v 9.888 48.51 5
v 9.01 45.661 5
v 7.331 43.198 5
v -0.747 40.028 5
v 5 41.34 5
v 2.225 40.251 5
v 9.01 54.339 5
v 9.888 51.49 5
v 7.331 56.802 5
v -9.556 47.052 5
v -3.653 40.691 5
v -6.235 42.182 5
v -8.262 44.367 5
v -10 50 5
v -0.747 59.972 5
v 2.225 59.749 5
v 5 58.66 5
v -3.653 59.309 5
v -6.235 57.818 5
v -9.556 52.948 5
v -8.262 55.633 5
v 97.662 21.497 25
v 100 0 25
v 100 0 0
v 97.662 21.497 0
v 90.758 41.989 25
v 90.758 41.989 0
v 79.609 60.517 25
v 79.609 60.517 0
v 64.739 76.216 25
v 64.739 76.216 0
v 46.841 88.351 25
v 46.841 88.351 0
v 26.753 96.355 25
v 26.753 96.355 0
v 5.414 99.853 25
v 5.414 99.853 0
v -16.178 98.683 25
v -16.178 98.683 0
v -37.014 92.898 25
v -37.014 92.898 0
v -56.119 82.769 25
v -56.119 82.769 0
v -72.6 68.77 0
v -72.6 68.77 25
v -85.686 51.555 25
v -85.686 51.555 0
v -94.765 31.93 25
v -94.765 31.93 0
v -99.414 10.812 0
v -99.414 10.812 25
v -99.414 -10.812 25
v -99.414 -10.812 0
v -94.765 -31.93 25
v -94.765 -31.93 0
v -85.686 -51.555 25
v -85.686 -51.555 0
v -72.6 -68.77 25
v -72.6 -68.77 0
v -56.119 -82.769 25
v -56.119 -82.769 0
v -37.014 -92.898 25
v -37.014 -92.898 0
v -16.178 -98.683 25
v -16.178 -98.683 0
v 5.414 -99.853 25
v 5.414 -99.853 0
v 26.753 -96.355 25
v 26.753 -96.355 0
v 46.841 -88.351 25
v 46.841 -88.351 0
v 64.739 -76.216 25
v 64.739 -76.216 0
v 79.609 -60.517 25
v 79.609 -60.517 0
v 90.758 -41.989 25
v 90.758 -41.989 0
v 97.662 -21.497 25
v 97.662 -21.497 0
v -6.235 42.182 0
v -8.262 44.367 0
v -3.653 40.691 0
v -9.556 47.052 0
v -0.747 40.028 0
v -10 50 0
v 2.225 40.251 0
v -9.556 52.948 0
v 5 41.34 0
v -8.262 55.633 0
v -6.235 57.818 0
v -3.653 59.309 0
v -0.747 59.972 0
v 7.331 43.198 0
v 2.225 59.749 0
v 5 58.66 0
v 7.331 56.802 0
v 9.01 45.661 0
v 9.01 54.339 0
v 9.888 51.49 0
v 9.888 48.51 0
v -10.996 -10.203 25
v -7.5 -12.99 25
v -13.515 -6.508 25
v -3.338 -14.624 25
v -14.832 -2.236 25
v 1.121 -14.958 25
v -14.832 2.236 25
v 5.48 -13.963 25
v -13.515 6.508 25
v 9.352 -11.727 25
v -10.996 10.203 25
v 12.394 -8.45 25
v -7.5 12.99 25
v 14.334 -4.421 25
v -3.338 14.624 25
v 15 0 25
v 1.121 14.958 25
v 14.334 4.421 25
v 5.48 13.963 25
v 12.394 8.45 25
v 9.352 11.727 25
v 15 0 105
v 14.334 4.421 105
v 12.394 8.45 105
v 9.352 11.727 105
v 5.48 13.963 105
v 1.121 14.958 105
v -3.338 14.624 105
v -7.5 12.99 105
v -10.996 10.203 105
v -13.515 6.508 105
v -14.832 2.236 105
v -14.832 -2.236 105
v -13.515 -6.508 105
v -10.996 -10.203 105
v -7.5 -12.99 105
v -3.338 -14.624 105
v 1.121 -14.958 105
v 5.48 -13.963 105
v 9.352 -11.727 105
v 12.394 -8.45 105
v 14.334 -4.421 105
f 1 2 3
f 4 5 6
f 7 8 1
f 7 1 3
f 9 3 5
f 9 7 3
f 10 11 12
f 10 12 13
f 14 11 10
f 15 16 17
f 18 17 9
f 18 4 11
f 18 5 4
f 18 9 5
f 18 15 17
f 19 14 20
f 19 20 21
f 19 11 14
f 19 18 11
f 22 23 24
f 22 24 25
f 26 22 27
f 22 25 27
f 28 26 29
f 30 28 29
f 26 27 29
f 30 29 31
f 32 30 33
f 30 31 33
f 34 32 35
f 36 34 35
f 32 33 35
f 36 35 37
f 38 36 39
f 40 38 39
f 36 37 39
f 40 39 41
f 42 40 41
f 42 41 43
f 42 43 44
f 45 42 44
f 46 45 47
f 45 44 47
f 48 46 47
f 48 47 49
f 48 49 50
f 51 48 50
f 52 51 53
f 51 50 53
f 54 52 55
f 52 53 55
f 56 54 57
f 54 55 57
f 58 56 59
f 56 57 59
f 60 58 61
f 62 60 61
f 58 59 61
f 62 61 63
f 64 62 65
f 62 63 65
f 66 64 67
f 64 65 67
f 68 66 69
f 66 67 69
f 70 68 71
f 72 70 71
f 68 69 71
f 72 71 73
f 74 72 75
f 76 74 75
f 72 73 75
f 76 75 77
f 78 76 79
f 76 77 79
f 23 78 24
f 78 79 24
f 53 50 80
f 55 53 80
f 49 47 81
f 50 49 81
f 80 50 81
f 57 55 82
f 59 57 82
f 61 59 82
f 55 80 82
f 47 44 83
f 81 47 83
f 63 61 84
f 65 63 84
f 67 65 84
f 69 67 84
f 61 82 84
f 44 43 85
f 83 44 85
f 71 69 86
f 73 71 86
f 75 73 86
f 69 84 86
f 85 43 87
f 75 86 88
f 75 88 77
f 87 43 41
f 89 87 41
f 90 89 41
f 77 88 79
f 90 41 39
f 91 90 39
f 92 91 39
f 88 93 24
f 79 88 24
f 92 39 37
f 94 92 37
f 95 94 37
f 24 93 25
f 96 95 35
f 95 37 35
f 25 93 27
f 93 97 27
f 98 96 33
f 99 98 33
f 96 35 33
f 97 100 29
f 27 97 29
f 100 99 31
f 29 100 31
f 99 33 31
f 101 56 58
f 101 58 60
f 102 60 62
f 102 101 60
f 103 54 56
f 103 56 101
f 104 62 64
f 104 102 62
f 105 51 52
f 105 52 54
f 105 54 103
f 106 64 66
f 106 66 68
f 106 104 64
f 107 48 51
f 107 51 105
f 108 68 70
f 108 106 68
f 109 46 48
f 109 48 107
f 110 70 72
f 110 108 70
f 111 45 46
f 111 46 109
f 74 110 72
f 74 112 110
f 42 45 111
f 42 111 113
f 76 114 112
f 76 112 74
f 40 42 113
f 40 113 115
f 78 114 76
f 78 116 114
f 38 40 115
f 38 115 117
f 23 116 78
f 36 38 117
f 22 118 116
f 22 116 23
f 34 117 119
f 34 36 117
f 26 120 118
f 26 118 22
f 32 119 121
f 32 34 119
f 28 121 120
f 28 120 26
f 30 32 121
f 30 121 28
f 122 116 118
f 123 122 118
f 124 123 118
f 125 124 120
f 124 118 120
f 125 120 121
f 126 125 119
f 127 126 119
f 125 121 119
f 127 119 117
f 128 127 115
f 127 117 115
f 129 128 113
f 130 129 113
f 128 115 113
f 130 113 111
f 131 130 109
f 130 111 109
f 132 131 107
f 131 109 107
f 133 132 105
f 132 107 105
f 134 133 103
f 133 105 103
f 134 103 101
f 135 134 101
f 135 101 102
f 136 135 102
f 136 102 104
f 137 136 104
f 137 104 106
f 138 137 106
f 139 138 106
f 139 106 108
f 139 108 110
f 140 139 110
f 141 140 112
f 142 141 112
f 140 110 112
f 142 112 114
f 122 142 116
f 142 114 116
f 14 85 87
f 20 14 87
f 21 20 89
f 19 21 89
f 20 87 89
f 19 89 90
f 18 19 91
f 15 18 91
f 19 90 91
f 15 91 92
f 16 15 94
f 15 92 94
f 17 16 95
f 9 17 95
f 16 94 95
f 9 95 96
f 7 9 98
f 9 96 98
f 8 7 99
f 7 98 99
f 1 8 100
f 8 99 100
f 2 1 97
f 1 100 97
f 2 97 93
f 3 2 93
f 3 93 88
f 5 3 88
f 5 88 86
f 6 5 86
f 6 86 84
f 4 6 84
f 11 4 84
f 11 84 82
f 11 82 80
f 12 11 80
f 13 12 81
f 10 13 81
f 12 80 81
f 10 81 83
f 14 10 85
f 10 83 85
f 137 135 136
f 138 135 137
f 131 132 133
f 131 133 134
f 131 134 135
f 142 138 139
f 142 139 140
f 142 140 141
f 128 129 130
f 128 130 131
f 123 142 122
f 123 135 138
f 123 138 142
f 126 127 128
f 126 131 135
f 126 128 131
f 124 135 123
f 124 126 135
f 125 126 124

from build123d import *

# Parameters (mm, degrees)
SKETCH1_R           = 100
BOSS_EXTRUDE1_DEPTH = 25
SKETCH2_R           = 15
BOSS_EXTRUDE2_DEPTH = 80
SKETCH3_R           = 10
CUT_EXTRUDE1_DEPTH  = 5


with BuildPart() as part:
    # Sketch1 → Boss-Extrude1 (new body)
    with BuildSketch(Plane.XY):
        Circle(SKETCH1_R)
    extrude(amount=BOSS_EXTRUDE1_DEPTH)

    # Sketch2 → Boss-Extrude2 (add)
    with BuildSketch(Plane.XY.offset(25)):
        Circle(SKETCH2_R)
    extrude(amount=BOSS_EXTRUDE2_DEPTH)

    # Sketch3 → Cut-Extrude1 (cut)
    with BuildSketch(Plane(origin=(0, 0, 0), x_dir=(-1, 0, 0), z_dir=(0, 0, -1))):
        with Locations((0, 50)):
            Circle(SKETCH3_R)
    extrude(amount=-CUT_EXTRUDE1_DEPTH, mode=Mode.SUBTRACT)


solid = part.part
